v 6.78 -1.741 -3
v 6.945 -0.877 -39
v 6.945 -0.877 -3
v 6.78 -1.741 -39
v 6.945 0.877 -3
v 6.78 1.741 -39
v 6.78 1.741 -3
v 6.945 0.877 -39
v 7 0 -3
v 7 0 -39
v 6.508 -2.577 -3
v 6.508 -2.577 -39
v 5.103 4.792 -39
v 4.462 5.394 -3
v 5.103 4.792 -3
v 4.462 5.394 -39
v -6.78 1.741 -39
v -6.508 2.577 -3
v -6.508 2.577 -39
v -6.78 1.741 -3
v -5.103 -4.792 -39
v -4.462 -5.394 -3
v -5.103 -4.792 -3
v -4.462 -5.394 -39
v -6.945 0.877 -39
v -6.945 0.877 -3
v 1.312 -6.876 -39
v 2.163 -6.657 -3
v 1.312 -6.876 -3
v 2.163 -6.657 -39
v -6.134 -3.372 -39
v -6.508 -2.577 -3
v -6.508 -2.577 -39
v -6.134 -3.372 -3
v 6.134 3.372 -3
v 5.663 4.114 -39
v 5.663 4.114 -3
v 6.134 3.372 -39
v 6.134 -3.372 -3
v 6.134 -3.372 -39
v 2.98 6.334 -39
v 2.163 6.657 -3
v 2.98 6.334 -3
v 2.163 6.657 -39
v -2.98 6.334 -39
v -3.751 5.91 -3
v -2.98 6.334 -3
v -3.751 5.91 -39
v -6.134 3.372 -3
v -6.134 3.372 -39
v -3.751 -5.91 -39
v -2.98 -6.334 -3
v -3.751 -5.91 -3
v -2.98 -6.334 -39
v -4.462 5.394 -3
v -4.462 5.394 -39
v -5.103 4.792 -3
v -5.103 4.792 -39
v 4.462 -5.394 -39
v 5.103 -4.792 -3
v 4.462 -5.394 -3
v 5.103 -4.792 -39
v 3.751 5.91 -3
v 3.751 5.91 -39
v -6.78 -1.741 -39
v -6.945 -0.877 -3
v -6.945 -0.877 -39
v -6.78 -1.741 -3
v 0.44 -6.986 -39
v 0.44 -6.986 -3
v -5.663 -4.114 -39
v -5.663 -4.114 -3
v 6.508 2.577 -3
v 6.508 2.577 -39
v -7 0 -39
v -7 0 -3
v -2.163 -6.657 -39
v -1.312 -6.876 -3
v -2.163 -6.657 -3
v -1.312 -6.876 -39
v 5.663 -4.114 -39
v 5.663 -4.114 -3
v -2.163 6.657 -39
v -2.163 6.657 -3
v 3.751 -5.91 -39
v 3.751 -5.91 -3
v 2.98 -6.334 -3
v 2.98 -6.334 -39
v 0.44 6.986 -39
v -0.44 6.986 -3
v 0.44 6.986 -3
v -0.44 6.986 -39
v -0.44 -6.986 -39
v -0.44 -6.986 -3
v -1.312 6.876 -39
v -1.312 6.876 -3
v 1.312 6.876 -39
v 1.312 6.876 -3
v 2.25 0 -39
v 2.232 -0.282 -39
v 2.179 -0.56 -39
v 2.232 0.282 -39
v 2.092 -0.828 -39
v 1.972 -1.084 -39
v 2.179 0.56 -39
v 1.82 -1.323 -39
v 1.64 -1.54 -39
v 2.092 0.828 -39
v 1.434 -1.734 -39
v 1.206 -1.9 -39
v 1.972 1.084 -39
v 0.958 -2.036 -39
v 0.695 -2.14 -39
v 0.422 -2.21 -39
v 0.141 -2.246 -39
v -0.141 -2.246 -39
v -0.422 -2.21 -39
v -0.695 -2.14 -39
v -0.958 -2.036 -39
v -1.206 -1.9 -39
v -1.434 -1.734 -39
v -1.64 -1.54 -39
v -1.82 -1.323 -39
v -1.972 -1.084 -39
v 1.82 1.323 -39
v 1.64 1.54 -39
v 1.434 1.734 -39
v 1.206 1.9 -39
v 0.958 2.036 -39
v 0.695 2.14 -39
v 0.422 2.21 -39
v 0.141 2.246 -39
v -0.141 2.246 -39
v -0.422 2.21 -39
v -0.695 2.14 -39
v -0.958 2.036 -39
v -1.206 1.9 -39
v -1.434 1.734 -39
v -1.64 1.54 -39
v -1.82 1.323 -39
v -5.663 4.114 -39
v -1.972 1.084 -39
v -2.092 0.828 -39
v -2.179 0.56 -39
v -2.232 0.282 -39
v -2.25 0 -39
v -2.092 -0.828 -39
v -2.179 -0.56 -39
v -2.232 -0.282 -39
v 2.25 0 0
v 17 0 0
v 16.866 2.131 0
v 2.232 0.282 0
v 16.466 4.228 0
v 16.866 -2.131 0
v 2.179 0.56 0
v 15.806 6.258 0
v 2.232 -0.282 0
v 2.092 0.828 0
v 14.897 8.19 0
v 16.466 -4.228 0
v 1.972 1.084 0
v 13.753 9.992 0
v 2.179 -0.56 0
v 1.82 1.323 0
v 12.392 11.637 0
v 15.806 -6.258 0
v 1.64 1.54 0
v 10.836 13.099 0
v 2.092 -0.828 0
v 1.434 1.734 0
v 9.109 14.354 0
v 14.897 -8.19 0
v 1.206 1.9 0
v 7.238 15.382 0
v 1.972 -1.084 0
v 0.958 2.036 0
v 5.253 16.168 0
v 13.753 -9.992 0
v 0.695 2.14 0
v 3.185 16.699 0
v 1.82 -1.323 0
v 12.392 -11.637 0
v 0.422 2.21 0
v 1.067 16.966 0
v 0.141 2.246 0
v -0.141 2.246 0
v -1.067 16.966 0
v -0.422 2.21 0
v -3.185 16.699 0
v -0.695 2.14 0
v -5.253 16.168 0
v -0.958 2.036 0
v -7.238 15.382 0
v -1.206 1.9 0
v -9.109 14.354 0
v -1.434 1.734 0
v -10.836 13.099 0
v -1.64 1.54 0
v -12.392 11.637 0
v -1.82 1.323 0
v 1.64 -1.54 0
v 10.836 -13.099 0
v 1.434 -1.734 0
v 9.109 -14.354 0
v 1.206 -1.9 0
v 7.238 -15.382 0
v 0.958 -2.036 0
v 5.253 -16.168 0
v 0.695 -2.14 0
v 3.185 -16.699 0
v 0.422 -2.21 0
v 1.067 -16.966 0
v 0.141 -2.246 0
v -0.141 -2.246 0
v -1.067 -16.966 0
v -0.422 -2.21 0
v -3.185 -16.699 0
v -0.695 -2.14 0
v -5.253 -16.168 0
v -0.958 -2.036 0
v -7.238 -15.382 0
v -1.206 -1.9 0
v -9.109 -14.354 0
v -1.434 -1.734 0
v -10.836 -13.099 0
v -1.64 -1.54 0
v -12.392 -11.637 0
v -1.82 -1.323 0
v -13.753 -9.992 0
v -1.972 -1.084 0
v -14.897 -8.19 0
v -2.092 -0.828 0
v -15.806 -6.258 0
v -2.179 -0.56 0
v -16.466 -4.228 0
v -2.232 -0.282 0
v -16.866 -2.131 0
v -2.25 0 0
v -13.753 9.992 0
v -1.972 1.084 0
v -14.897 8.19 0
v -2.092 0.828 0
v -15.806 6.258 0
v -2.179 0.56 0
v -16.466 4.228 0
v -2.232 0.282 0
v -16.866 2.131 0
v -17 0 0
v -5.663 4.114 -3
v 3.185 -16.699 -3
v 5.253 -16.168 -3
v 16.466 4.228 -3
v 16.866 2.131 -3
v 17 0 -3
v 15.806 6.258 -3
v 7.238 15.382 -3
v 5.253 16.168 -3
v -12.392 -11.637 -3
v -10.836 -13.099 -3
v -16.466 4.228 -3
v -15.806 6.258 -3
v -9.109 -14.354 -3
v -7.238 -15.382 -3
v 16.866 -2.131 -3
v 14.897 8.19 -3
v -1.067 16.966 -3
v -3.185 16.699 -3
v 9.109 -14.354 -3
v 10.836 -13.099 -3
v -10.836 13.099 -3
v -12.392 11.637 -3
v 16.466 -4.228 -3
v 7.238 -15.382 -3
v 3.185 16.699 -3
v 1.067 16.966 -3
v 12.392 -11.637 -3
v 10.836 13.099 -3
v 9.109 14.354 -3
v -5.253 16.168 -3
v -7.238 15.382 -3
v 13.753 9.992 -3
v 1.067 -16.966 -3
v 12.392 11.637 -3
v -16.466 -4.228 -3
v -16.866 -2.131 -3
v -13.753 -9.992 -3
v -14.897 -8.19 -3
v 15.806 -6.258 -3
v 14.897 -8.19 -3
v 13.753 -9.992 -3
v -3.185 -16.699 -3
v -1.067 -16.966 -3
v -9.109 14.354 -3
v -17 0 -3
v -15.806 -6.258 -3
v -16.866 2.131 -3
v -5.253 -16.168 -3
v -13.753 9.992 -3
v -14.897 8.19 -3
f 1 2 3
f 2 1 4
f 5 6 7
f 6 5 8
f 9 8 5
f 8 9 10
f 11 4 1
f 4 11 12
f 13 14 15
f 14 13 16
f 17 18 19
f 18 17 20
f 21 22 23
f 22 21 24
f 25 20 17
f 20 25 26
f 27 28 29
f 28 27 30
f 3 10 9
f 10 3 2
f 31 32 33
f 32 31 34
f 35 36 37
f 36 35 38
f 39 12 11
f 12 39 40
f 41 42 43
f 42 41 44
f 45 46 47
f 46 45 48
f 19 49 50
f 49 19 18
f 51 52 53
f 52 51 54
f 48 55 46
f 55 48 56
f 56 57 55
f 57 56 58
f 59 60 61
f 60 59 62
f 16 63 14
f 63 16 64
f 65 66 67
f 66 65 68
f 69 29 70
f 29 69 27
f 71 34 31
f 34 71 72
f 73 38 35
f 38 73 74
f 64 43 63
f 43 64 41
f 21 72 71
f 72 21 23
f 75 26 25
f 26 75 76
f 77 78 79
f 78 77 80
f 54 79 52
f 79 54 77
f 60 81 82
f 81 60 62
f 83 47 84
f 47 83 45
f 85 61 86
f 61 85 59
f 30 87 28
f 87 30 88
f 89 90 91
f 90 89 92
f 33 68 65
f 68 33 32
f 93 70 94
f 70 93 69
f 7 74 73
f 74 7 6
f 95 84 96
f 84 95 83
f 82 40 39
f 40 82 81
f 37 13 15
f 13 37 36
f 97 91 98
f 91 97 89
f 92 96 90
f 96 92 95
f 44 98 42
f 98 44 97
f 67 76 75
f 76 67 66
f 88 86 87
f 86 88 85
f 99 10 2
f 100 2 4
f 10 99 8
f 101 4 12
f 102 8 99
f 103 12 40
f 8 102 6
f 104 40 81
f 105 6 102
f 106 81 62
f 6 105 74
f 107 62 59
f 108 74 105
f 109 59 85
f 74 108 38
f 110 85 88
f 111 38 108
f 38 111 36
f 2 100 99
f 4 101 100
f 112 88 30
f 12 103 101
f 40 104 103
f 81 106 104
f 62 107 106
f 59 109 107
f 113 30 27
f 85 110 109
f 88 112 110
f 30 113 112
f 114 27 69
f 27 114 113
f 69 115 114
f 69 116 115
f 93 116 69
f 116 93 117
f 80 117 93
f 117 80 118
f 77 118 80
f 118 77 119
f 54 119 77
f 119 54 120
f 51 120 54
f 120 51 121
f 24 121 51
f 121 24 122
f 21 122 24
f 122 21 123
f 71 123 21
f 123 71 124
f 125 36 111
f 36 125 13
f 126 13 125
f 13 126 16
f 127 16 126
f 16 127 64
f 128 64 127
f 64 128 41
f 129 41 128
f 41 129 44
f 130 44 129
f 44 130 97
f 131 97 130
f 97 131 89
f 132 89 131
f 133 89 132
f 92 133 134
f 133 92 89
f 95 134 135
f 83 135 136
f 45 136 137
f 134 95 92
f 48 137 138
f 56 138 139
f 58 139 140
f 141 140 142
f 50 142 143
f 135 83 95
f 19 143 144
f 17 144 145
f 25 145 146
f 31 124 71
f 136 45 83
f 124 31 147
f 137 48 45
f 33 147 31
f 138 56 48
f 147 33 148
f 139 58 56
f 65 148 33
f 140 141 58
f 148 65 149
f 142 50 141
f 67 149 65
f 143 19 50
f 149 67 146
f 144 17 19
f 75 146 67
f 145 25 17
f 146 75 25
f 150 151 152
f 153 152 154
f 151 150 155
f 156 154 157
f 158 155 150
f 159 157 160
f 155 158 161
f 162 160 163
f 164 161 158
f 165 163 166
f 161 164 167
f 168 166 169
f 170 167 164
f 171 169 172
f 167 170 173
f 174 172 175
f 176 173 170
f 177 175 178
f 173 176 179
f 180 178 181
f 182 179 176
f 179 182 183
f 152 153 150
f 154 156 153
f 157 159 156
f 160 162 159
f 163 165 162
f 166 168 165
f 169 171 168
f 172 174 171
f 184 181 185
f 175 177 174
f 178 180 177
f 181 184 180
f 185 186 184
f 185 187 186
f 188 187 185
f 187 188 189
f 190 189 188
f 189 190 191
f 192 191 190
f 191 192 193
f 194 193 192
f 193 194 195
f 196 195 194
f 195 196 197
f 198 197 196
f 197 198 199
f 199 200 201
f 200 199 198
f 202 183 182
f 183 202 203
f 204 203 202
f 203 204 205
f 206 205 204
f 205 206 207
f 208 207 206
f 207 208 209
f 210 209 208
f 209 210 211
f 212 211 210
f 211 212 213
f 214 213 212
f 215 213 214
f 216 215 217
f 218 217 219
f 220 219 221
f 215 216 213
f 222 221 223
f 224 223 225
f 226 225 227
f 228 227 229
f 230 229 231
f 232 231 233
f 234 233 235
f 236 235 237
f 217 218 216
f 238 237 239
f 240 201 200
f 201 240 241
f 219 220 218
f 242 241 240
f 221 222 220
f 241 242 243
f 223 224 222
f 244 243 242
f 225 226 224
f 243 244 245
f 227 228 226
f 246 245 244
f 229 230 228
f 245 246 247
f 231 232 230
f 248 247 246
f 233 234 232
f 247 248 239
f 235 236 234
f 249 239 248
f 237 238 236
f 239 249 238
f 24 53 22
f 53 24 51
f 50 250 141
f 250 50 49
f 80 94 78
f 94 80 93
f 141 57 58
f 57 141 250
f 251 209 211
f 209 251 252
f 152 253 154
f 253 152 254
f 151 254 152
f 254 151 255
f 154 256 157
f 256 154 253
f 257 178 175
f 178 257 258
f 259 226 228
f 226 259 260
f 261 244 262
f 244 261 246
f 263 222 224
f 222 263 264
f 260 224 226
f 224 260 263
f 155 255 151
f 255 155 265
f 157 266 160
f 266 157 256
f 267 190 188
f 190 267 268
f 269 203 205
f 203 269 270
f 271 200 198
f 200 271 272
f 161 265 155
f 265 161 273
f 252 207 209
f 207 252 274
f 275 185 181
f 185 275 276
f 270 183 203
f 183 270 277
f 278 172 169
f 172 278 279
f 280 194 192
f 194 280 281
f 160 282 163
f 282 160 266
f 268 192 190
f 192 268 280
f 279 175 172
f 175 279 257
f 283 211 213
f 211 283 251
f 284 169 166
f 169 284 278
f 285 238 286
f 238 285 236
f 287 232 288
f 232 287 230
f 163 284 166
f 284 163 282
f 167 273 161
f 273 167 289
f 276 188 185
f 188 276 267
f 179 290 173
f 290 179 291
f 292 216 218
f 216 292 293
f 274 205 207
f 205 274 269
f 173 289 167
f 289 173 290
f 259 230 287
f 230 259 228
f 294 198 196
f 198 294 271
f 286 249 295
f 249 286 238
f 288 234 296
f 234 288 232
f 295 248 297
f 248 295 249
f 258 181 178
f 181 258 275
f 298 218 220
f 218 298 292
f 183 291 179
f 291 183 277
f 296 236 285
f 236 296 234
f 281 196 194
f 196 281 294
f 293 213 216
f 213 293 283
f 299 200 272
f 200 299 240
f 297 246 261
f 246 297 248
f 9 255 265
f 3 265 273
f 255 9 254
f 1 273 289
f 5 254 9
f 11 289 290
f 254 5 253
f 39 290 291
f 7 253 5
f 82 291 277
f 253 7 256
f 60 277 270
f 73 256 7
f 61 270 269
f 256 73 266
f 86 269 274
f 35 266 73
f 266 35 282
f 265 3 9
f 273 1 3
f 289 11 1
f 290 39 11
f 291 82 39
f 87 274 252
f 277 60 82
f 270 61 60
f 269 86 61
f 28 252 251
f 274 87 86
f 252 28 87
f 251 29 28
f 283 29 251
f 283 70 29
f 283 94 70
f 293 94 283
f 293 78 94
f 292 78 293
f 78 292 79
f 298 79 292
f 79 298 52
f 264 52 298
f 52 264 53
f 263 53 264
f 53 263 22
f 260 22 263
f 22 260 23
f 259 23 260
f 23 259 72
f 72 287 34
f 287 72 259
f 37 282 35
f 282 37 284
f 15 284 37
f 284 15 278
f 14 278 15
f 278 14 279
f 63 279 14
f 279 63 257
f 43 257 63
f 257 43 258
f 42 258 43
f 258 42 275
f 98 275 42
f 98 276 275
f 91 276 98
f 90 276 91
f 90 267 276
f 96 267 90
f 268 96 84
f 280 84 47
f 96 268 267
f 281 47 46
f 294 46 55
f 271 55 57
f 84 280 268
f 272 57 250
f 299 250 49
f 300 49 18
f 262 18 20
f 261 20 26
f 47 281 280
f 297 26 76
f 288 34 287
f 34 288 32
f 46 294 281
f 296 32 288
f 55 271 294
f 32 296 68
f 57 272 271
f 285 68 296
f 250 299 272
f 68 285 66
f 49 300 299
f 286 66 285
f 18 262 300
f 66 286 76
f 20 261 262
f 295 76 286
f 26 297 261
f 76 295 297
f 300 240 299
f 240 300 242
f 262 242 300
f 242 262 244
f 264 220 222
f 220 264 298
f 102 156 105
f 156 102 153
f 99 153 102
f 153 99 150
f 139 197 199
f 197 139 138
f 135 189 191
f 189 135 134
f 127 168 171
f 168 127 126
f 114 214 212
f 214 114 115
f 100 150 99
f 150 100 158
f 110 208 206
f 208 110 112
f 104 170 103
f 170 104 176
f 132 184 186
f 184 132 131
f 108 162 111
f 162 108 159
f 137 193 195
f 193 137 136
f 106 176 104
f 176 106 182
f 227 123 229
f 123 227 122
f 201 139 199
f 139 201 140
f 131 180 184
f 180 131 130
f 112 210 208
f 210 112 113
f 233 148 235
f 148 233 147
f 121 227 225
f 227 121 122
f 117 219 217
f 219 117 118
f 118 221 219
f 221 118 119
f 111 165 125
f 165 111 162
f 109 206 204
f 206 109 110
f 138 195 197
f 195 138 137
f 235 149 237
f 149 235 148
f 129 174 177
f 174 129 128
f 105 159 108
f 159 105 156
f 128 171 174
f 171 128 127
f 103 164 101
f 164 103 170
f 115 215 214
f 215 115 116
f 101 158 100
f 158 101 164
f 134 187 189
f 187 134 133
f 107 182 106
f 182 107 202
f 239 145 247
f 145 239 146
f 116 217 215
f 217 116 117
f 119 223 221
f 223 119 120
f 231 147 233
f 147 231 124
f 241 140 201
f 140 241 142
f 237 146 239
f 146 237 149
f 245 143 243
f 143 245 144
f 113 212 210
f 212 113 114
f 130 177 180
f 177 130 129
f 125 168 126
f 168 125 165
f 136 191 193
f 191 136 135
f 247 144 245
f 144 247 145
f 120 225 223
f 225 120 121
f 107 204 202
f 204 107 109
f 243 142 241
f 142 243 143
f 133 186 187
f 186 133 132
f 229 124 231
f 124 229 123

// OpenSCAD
$fn = 50;


difference() {
	union() {
		translate(v = [0, 0, -39.0000000000]) {
			cylinder(h = 39, r = 7.0000000000);
		}
		translate(v = [0, 0, -3.0000000000]) {
			cylinder(h = 3, r = 17.0000000000);
		}
	}
	union() {
		#translate(v = [0, 0, -39]) {
			cylinder(h = 39, r = 2.2500000000);
		}
	}
}
